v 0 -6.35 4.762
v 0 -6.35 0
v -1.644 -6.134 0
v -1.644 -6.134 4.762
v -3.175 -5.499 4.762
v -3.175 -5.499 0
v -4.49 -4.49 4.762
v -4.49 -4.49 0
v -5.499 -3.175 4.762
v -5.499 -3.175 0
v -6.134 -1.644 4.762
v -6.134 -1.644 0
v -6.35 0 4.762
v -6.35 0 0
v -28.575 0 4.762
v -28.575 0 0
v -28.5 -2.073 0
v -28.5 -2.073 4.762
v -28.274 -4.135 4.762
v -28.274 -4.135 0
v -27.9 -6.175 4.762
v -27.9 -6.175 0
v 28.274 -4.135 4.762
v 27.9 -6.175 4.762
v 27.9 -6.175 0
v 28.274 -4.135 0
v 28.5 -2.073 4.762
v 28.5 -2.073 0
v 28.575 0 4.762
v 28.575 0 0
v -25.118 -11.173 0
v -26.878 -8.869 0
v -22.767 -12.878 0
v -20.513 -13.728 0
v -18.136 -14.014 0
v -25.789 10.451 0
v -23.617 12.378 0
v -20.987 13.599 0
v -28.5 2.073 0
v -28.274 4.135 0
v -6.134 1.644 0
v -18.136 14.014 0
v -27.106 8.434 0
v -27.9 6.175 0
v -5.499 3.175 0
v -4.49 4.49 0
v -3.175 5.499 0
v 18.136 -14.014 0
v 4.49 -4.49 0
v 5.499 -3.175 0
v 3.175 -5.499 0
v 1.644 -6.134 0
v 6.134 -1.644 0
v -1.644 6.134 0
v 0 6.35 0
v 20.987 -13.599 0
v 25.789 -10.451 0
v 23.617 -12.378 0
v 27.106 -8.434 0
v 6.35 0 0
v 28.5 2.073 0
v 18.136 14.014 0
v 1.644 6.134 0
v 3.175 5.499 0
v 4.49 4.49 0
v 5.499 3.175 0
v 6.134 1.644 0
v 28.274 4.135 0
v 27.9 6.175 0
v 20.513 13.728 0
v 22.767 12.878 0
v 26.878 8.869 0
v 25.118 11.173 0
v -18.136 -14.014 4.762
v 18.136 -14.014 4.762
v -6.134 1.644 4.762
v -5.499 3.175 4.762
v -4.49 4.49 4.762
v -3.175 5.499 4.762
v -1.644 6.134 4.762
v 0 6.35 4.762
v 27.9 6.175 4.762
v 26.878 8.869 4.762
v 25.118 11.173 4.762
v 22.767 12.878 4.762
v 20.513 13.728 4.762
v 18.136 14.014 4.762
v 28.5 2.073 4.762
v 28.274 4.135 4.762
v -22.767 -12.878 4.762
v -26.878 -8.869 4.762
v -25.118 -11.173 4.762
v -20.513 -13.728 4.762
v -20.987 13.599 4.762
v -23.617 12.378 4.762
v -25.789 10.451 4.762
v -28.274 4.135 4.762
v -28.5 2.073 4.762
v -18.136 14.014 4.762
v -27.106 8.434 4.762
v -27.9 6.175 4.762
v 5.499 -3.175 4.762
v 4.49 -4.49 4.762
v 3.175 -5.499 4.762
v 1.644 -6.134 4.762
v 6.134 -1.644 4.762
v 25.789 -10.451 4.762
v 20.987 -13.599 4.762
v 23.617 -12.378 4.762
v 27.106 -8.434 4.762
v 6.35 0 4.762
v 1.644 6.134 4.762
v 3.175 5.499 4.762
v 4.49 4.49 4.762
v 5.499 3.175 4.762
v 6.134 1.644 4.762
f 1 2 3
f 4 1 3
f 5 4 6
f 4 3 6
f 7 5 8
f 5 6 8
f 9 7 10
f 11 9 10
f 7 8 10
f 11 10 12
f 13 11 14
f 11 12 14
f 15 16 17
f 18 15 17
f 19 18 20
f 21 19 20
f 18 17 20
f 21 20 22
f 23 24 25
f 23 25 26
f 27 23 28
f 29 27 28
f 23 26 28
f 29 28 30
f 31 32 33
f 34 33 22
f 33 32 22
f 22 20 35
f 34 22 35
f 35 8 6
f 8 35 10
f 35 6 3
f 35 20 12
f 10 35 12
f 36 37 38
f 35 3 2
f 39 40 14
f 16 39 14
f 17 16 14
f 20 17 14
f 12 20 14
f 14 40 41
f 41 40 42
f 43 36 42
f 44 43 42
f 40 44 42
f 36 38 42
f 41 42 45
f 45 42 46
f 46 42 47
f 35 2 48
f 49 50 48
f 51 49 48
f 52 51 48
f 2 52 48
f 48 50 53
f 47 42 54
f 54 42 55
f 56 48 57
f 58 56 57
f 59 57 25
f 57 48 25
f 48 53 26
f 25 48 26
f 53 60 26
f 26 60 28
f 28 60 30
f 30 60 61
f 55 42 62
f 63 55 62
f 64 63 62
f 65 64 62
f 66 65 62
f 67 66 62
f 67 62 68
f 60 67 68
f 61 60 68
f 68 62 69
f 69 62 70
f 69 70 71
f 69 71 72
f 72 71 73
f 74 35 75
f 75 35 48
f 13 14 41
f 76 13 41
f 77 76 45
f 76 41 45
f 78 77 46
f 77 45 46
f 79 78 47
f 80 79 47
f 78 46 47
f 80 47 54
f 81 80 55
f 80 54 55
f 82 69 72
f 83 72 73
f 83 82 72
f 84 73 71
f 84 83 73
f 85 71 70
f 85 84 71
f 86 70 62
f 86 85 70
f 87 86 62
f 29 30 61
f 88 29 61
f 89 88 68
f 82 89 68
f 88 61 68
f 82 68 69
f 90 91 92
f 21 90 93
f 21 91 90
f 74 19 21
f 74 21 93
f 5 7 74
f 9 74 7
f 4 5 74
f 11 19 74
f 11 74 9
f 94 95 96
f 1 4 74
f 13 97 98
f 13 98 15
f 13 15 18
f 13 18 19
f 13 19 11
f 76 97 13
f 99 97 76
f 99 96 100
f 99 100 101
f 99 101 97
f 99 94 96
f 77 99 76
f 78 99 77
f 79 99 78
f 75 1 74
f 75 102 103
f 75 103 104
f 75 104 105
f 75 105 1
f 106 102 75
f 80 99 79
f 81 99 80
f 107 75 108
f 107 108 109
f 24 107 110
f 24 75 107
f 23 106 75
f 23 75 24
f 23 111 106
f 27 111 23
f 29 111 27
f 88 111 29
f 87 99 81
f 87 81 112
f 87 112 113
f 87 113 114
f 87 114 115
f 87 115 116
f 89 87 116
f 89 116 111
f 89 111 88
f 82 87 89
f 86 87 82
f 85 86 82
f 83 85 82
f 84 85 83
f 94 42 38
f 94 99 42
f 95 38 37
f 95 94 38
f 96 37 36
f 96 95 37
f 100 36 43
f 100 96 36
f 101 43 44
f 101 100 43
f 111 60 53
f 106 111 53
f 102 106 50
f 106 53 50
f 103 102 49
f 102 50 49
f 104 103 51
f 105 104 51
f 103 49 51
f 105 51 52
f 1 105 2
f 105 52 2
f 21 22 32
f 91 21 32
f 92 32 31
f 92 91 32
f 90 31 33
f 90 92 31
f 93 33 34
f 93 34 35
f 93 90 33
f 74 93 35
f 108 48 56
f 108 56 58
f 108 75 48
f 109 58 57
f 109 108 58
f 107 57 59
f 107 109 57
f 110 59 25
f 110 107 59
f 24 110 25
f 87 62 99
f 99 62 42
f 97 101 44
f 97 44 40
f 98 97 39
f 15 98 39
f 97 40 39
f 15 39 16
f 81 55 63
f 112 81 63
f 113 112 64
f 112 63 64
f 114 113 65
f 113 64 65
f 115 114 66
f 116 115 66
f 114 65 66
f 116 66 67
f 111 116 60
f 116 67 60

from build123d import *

# Parameters (mm, degrees)
F1_DEPTH = 4.7625
F2_R     = 10


# Not quite as in the source:
# - a feature names something its author has since deleted; it is built from what else it names


with BuildPart() as f1:
    # F0 (on Top) → F1 (new body)
    with BuildSketch(Plane.XY):
        with BuildLine():
            ThreePointArc((-6.35, 0), (-4.4901280605, 4.4901280605), (0, 6.35))
            Line((0, 6.35), (-12.4931629071, 6.35))
            ThreePointArc((-12.4931629071, 6.35), (-13.6287381062, 3.2648303256), (-14.0143362106, 0))
            Line((-14.0143362106, 0), (-6.35, 0))
        make_face()
        with BuildLine():
            ThreePointArc((0, 6.35), (4.4901280605, 4.4901280605), (6.35, 0))
            Line((6.35, 0), (14.0143362106, 0))
            ThreePointArc((14.0143362106, 0), (13.6287381062, 3.2648303256), (12.4931629071, 6.35))
            Line((12.4931629071, 6.35), (0, 6.35))
        make_face()
        with BuildLine():
            Line((12.4931629071, -6.35), (0, -6.35))
            Line((0, -6.35), (0, -14.0143362106))
            ThreePointArc((0, -14.0143362106), (7.3283894713, -11.9455567966), (12.4931629071, -6.35))
        make_face()
        with BuildLine():
            Line((0, -14.0143362106), (0, -6.35))
            Line((0, -6.35), (-12.4931629071, -6.35))
            ThreePointArc((-12.4931629071, -6.35), (-7.3283894713, -11.9455567966), (0, -14.0143362106))
        make_face()
        with BuildLine():
            Line((-12.4931629071, -6.35), (0, -6.35))
            ThreePointArc((0, -6.35), (-4.4901280605, -4.4901280605), (-6.35, 0))
            Line((-6.35, 0), (-14.0143362106, 0))
            ThreePointArc((-14.0143362106, 0), (-13.6287381062, -3.2648303256), (-12.4931629071, -6.35))
        make_face()
        with BuildLine():
            Line((-27.86051193, -6.35), (-12.4931629071, -6.35))
            ThreePointArc((-12.4931629071, -6.35), (-13.6287381062, -3.2648303256), (-14.0143362106, 0))
            Line((-14.0143362106, 0), (-28.575, 0))
            ThreePointArc((-28.575, 0), (-28.395816183, -3.1950349451), (-27.86051193, -6.35))
        make_face()
        with BuildLine():
            ThreePointArc((12.4931629071, 6.35), (13.6287381062, 3.2648303256), (14.0143362106, 0))
            Line((14.0143362106, 0), (28.575, 0))
            ThreePointArc((28.575, 0), (28.395816183, 3.1950349451), (27.86051193, 6.35))
            Line((27.86051193, 6.35), (12.4931629071, 6.35))
        make_face()
        with BuildLine():
            Line((0, 14.0143362106), (0, 6.35))
            Line((0, 6.35), (12.4931629071, 6.35))
            ThreePointArc((12.4931629071, 6.35), (7.3283894713, 11.9455567966), (0, 14.0143362106))
        make_face()
        with BuildLine():
            Line((-12.4931629071, 6.35), (0, 6.35))
            Line((0, 6.35), (0, 14.0143362106))
            ThreePointArc((0, 14.0143362106), (-7.3283894713, 11.9455567966), (-12.4931629071, 6.35))
        make_face()
        with BuildLine():
            Line((-24.9023895556, -14.0143362106), (0, -14.0143362106))
            ThreePointArc((0, -14.0143362106), (-7.3283894713, -11.9455567966), (-12.4931629071, -6.35))
            Line((-12.4931629071, -6.35), (-27.86051193, -6.35))
            ThreePointArc((-27.86051193, -6.35), (-26.6583280736, -10.2890315054), (-24.9023895556, -14.0143362106))
        make_face()
        with BuildLine():
            Line((24.9023895556, 14.0143362106), (0, 14.0143362106))
            ThreePointArc((0, 14.0143362106), (7.3283894713, 11.9455567966), (12.4931629071, 6.35))
            Line((12.4931629071, 6.35), (27.86051193, 6.35))
            ThreePointArc((27.86051193, 6.35), (26.6583280736, 10.2890315054), (24.9023895556, 14.0143362106))
        make_face()
        with BuildLine():
            Line((14.0143362106, 0), (6.35, 0))
            ThreePointArc((6.35, 0), (4.4901280605, -4.4901280605), (0, -6.35))
            Line((0, -6.35), (12.4931629071, -6.35))
            ThreePointArc((12.4931629071, -6.35), (13.6287381062, -3.2648303256), (14.0143362106, 0))
        make_face()
        with BuildLine():
            ThreePointArc((-14.0143362106, 0), (-13.6287381062, 3.2648303256), (-12.4931629071, 6.35))
            Line((-12.4931629071, 6.35), (-27.86051193, 6.35))
            ThreePointArc((-27.86051193, 6.35), (-28.395816183, 3.1950349451), (-28.575, 0))
            Line((-28.575, 0), (-14.0143362106, 0))
        make_face()
        with BuildLine():
            ThreePointArc((-12.4931629071, 6.35), (-7.3283894713, 11.9455567966), (0, 14.0143362106))
            Line((0, 14.0143362106), (-24.9023895556, 14.0143362106))
            ThreePointArc((-24.9023895556, 14.0143362106), (-26.6583280736, 10.2890315054), (-27.86051193, 6.35))
            Line((-27.86051193, 6.35), (-12.4931629071, 6.35))
        make_face()
        with BuildLine():
            Line((28.575, 0), (14.0143362106, 0))
            ThreePointArc((14.0143362106, 0), (13.6287381062, -3.2648303256), (12.4931629071, -6.35))
            Line((12.4931629071, -6.35), (27.86051193, -6.35))
            ThreePointArc((27.86051193, -6.35), (28.395816183, -3.1950349451), (28.575, 0))
        make_face()
        with BuildLine():
            ThreePointArc((12.4931629071, -6.35), (7.3283894713, -11.9455567966), (0, -14.0143362106))
            Line((0, -14.0143362106), (24.9023895556, -14.0143362106))
            ThreePointArc((24.9023895556, -14.0143362106), (26.6583280736, -10.2890315054), (27.86051193, -6.35))
            Line((27.86051193, -6.35), (12.4931629071, -6.35))
        make_face()
    extrude(amount=F1_DEPTH)

    # F2
    f2_edges = [f1.edges().sort_by_distance(p)[0] for p in [
        (24.90239, 14.014336, 2.38125),
        (-24.90239, 14.014336, 2.38125),
        (24.90239, -14.014336, 2.38125),
        (-24.90239, -14.014336, 2.38125),
    ]]
    fillet(f2_edges, radius=F2_R)


solid = f1.part
